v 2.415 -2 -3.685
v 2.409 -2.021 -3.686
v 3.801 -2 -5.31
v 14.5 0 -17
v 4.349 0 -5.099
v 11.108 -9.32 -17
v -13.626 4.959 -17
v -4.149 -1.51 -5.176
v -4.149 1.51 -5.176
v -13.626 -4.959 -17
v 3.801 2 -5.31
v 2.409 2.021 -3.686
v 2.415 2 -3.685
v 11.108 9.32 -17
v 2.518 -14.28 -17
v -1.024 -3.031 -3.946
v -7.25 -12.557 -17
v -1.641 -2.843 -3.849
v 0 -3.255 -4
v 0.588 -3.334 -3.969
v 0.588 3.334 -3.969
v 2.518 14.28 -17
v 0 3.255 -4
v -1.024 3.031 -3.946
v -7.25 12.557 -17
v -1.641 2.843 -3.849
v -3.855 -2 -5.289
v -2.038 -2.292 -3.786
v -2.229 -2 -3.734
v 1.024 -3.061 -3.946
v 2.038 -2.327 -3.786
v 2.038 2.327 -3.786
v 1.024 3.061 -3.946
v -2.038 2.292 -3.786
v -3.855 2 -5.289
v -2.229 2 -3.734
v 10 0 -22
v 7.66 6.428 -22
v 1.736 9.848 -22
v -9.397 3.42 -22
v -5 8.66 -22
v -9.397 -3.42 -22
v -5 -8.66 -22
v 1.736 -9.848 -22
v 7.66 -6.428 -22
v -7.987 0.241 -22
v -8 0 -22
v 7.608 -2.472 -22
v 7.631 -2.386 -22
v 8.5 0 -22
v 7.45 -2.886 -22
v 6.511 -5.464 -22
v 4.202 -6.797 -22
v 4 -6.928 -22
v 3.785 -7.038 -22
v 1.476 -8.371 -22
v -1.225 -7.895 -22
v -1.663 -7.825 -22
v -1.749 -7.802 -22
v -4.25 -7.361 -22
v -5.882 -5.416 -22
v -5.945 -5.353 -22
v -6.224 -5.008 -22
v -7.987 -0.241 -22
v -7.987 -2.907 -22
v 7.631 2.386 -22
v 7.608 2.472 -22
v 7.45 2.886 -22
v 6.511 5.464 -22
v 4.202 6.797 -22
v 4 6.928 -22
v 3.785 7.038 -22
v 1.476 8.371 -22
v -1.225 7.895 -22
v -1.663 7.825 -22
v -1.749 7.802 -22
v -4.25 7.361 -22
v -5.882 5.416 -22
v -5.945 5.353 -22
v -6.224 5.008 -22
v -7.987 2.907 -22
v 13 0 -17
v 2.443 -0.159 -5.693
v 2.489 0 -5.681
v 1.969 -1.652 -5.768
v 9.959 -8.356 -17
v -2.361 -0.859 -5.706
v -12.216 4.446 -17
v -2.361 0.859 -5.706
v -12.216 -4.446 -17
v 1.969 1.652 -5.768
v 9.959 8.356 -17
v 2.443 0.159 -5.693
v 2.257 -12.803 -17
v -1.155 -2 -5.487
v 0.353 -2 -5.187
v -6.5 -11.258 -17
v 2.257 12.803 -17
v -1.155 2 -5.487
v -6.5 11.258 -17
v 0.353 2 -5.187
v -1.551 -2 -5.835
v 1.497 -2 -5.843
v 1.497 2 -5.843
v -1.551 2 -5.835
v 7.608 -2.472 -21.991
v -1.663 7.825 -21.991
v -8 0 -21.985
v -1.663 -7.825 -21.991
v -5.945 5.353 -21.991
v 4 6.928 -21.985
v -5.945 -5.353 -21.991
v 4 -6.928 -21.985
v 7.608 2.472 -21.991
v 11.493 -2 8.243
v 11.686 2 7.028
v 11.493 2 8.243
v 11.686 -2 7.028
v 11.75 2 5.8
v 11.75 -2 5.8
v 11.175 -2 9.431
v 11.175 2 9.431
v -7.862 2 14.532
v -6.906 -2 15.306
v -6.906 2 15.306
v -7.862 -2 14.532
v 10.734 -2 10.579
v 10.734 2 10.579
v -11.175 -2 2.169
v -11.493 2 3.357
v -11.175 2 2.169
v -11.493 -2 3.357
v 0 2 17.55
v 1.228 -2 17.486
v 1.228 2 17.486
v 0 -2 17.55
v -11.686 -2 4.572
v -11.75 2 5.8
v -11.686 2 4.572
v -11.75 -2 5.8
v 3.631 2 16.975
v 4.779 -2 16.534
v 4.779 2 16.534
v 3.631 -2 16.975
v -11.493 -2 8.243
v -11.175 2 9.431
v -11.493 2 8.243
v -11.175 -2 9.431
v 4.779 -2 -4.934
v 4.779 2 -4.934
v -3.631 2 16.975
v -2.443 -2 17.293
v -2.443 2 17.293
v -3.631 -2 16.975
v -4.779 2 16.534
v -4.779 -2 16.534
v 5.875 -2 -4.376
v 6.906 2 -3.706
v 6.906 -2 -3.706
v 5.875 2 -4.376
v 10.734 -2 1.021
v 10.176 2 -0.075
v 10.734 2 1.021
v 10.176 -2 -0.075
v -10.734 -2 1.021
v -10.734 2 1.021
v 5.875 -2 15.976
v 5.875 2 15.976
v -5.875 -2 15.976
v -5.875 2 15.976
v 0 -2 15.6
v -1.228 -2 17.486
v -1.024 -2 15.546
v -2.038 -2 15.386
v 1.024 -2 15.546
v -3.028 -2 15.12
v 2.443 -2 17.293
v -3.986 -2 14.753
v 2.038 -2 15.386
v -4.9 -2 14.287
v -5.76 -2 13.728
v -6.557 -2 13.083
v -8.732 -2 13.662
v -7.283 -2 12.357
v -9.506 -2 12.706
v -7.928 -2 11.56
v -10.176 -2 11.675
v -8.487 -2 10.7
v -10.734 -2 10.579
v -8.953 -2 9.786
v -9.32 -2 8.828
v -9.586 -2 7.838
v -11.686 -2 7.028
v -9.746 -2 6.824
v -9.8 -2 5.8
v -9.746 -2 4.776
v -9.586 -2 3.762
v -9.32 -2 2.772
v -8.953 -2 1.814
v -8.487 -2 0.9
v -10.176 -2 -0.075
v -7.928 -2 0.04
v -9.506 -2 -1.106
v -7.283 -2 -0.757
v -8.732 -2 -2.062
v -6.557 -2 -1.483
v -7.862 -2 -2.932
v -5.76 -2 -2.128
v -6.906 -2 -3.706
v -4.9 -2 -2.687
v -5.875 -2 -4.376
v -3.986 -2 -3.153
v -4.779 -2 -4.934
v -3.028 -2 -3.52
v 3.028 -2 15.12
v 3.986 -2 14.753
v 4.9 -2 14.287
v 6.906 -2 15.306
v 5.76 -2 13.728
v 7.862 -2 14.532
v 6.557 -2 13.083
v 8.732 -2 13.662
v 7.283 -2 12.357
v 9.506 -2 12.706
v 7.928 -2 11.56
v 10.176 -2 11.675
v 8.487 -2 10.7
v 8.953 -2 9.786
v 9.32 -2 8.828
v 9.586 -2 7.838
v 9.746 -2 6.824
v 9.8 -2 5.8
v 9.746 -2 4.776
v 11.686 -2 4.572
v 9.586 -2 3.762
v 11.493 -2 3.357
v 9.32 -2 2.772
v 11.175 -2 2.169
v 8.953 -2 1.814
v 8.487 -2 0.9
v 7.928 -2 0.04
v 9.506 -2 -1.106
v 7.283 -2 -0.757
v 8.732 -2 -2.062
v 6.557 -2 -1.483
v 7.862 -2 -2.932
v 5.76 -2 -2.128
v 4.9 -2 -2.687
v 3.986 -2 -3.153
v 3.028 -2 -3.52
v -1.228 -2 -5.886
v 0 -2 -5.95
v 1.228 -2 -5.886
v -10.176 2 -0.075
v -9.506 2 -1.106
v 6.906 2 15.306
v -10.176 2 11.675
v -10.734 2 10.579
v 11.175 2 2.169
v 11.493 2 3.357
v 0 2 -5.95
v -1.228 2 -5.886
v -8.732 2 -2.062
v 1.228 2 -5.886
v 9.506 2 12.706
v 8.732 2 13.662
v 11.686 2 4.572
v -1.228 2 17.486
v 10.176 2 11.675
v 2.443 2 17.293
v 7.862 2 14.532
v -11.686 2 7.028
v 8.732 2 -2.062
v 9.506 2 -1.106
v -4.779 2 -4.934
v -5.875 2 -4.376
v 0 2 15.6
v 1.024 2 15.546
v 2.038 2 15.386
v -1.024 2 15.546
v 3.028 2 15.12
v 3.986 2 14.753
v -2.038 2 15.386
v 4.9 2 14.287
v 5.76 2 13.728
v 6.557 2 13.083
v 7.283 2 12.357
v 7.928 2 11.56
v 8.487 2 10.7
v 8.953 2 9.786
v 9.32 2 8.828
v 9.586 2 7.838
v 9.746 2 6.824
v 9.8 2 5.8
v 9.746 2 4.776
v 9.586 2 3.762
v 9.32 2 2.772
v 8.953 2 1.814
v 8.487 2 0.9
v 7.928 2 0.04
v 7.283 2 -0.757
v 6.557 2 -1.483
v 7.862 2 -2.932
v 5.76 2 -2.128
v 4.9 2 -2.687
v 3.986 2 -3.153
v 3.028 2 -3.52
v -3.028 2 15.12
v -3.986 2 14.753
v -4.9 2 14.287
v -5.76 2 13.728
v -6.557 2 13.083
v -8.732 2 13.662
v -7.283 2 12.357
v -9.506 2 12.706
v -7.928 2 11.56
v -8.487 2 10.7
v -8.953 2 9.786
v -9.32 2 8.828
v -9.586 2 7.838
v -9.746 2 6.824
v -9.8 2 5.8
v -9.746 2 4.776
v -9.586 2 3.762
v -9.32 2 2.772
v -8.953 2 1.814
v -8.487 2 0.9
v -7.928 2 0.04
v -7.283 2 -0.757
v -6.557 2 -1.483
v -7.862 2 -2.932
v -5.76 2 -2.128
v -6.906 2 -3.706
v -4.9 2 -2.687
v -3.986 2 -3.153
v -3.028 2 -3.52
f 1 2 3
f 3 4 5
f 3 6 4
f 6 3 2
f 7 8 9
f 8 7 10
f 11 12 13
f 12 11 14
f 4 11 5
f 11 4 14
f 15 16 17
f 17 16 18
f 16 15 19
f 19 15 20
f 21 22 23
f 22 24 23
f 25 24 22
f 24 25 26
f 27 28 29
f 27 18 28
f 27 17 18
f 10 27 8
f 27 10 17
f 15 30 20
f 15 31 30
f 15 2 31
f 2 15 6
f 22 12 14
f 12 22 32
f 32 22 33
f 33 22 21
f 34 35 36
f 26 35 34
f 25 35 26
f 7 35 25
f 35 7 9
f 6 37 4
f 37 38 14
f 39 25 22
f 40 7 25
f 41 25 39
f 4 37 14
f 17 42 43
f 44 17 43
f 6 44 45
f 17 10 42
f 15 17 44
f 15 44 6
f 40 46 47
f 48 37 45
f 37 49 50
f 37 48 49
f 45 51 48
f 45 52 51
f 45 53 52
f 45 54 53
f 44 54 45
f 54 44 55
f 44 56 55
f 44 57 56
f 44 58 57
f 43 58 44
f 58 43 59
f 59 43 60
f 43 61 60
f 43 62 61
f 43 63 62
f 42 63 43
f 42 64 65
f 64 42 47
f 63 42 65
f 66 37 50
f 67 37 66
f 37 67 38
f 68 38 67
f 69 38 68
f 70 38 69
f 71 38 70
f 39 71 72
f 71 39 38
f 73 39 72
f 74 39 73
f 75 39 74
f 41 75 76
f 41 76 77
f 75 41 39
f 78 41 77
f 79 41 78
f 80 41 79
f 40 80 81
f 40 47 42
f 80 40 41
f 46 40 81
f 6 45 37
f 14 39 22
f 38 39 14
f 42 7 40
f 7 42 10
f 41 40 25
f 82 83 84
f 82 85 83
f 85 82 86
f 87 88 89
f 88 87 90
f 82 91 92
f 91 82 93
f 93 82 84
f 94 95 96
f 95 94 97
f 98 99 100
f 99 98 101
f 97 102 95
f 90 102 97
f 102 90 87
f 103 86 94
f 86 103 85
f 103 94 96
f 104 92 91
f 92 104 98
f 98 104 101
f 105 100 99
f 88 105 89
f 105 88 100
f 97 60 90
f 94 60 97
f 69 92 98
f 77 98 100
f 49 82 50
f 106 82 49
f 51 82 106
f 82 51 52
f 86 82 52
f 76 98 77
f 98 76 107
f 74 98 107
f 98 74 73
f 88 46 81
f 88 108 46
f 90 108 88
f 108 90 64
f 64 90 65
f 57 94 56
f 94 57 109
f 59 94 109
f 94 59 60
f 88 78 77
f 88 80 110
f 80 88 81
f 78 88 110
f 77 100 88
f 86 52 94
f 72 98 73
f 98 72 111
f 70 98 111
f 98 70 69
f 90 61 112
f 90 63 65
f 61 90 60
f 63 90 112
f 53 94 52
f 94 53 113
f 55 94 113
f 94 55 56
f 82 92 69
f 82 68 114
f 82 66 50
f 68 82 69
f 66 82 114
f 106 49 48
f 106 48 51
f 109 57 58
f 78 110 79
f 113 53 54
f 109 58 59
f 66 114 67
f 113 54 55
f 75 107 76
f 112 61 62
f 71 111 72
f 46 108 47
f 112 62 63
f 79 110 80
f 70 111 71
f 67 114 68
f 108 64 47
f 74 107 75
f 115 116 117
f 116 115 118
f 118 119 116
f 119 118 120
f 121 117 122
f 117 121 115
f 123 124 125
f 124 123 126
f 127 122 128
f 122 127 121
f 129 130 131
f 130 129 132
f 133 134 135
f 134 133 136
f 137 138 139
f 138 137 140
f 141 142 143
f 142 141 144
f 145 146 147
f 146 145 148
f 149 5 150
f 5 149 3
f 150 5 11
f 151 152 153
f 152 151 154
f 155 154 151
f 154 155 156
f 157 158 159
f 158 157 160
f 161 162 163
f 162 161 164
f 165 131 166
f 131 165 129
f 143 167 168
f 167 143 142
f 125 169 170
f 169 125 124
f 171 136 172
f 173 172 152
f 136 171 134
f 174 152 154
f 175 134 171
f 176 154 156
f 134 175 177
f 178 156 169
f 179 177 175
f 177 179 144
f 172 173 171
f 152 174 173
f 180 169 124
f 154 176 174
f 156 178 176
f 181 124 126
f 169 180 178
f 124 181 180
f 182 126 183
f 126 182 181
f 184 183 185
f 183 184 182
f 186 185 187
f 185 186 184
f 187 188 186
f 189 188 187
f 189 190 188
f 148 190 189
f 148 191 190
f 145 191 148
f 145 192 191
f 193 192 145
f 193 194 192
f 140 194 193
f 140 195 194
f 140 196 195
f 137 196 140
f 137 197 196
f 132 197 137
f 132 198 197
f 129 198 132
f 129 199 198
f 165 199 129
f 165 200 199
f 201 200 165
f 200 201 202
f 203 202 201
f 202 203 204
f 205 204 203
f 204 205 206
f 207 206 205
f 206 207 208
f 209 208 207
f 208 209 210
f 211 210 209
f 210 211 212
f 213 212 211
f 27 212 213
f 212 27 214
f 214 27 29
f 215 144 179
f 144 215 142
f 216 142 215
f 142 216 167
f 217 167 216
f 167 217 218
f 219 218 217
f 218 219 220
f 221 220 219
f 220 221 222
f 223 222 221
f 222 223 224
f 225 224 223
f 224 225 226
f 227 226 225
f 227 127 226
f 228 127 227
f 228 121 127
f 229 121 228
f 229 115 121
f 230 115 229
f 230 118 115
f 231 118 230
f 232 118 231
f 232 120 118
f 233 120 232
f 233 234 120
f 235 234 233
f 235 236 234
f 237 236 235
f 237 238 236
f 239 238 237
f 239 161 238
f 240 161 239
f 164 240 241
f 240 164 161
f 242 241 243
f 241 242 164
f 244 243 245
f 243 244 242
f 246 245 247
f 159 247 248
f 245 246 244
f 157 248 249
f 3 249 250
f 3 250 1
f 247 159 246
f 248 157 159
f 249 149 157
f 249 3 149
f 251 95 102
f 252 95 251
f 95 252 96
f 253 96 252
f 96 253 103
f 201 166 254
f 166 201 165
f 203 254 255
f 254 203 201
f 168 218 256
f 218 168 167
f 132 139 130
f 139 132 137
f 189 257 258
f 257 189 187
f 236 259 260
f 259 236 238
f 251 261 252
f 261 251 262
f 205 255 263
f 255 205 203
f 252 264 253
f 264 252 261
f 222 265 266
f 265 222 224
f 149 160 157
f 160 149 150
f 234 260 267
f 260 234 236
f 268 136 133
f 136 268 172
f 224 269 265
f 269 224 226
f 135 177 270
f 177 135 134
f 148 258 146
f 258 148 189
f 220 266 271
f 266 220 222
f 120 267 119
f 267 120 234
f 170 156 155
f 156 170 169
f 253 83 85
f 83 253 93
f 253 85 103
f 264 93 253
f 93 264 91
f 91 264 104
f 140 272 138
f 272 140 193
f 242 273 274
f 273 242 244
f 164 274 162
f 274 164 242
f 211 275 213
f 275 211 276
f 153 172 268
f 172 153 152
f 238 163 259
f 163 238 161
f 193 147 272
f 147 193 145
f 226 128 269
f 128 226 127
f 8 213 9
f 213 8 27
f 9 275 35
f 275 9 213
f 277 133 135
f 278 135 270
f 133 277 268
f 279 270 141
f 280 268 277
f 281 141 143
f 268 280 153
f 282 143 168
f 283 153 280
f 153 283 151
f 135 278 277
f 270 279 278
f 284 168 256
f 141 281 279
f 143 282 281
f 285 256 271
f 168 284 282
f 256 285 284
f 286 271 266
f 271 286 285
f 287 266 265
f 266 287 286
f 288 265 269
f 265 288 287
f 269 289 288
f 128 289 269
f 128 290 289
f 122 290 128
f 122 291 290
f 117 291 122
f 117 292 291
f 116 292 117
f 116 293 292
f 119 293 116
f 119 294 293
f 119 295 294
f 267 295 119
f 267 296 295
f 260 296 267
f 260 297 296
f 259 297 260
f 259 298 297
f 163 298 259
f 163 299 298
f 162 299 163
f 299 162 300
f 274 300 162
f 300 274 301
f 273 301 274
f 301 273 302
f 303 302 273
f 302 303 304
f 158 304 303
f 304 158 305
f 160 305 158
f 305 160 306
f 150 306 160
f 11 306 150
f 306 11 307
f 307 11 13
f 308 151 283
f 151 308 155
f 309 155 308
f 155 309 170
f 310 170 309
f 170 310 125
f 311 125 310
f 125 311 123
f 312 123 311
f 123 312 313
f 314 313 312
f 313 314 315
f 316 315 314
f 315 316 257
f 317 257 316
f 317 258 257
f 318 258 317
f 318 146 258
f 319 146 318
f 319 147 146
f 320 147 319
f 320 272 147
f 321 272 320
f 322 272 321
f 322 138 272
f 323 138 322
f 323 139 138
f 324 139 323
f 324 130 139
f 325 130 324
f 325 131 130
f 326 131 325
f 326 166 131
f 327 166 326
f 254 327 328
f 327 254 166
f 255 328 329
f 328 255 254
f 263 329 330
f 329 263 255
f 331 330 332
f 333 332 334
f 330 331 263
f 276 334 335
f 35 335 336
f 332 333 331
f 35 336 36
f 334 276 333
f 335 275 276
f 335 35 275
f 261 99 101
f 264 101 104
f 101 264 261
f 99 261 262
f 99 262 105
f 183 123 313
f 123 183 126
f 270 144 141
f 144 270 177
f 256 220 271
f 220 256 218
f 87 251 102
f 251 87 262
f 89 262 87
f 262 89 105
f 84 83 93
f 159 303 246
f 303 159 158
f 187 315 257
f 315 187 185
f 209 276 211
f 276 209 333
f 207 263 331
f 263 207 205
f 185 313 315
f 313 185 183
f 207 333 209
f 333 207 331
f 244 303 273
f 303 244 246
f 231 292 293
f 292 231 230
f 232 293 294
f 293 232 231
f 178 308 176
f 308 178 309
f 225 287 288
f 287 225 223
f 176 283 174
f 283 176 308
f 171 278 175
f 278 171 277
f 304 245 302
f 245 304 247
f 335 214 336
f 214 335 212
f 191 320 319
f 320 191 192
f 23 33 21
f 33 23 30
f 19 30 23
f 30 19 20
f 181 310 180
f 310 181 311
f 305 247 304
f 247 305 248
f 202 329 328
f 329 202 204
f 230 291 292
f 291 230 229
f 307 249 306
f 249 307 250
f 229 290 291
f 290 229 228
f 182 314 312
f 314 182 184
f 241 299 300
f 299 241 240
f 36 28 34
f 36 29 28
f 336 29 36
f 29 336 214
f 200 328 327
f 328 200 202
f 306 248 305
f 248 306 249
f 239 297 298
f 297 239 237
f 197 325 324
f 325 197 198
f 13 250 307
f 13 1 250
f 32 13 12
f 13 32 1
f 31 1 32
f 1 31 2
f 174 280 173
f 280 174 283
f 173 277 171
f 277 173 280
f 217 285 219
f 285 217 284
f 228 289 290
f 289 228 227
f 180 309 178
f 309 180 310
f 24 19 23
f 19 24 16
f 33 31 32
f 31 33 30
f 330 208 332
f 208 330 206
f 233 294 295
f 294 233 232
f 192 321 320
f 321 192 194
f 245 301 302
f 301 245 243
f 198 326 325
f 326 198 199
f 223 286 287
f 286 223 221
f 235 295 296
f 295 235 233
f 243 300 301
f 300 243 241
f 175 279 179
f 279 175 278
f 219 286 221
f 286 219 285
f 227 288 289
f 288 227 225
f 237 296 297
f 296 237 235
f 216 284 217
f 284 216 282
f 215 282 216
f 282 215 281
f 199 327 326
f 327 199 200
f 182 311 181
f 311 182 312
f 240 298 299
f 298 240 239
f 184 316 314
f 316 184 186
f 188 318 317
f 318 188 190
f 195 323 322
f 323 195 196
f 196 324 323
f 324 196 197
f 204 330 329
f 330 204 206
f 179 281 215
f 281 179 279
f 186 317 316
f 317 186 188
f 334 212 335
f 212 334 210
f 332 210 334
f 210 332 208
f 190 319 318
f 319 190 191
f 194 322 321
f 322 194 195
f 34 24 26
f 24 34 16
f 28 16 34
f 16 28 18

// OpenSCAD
// Internal diameter of ring (in mm).
internal_diameter = 19.6;
$fn=60 * 1;


module diamond(w, w2, h1, h2) {
    $fn=9;
    cylinder(d1=0, d2=w, h=h1);
    translate([0, 0, h1]) cylinder(d1=w, d2=w2, h=h2);
}

module dvase(w, w2, h1, h2) {
    difference() {
            diamond(w, w2, h1, h2);
            translate([0, 0, 3]) diamond(w-3, w2-3, h1-3, h2);
            translate([0, 0, h1-.1]) cylinder(d=w2-4, h=h2+1);
    }
}

module ring(id) {
    off = (id / 2) - 4;
    difference() {
        union()
        {
            rotate([180, 0, 0]) dvase(29, 20, 17, 5);
            translate([0, 0, off]) rotate([90, 0, 0])cylinder(d=id+3.9, h=4, center=true);
        }
        translate([0, 0, off]) rotate([90, 0, 0]) cylinder(d=id, h=25, center=true);
    }
}

ring(internal_diameter);
